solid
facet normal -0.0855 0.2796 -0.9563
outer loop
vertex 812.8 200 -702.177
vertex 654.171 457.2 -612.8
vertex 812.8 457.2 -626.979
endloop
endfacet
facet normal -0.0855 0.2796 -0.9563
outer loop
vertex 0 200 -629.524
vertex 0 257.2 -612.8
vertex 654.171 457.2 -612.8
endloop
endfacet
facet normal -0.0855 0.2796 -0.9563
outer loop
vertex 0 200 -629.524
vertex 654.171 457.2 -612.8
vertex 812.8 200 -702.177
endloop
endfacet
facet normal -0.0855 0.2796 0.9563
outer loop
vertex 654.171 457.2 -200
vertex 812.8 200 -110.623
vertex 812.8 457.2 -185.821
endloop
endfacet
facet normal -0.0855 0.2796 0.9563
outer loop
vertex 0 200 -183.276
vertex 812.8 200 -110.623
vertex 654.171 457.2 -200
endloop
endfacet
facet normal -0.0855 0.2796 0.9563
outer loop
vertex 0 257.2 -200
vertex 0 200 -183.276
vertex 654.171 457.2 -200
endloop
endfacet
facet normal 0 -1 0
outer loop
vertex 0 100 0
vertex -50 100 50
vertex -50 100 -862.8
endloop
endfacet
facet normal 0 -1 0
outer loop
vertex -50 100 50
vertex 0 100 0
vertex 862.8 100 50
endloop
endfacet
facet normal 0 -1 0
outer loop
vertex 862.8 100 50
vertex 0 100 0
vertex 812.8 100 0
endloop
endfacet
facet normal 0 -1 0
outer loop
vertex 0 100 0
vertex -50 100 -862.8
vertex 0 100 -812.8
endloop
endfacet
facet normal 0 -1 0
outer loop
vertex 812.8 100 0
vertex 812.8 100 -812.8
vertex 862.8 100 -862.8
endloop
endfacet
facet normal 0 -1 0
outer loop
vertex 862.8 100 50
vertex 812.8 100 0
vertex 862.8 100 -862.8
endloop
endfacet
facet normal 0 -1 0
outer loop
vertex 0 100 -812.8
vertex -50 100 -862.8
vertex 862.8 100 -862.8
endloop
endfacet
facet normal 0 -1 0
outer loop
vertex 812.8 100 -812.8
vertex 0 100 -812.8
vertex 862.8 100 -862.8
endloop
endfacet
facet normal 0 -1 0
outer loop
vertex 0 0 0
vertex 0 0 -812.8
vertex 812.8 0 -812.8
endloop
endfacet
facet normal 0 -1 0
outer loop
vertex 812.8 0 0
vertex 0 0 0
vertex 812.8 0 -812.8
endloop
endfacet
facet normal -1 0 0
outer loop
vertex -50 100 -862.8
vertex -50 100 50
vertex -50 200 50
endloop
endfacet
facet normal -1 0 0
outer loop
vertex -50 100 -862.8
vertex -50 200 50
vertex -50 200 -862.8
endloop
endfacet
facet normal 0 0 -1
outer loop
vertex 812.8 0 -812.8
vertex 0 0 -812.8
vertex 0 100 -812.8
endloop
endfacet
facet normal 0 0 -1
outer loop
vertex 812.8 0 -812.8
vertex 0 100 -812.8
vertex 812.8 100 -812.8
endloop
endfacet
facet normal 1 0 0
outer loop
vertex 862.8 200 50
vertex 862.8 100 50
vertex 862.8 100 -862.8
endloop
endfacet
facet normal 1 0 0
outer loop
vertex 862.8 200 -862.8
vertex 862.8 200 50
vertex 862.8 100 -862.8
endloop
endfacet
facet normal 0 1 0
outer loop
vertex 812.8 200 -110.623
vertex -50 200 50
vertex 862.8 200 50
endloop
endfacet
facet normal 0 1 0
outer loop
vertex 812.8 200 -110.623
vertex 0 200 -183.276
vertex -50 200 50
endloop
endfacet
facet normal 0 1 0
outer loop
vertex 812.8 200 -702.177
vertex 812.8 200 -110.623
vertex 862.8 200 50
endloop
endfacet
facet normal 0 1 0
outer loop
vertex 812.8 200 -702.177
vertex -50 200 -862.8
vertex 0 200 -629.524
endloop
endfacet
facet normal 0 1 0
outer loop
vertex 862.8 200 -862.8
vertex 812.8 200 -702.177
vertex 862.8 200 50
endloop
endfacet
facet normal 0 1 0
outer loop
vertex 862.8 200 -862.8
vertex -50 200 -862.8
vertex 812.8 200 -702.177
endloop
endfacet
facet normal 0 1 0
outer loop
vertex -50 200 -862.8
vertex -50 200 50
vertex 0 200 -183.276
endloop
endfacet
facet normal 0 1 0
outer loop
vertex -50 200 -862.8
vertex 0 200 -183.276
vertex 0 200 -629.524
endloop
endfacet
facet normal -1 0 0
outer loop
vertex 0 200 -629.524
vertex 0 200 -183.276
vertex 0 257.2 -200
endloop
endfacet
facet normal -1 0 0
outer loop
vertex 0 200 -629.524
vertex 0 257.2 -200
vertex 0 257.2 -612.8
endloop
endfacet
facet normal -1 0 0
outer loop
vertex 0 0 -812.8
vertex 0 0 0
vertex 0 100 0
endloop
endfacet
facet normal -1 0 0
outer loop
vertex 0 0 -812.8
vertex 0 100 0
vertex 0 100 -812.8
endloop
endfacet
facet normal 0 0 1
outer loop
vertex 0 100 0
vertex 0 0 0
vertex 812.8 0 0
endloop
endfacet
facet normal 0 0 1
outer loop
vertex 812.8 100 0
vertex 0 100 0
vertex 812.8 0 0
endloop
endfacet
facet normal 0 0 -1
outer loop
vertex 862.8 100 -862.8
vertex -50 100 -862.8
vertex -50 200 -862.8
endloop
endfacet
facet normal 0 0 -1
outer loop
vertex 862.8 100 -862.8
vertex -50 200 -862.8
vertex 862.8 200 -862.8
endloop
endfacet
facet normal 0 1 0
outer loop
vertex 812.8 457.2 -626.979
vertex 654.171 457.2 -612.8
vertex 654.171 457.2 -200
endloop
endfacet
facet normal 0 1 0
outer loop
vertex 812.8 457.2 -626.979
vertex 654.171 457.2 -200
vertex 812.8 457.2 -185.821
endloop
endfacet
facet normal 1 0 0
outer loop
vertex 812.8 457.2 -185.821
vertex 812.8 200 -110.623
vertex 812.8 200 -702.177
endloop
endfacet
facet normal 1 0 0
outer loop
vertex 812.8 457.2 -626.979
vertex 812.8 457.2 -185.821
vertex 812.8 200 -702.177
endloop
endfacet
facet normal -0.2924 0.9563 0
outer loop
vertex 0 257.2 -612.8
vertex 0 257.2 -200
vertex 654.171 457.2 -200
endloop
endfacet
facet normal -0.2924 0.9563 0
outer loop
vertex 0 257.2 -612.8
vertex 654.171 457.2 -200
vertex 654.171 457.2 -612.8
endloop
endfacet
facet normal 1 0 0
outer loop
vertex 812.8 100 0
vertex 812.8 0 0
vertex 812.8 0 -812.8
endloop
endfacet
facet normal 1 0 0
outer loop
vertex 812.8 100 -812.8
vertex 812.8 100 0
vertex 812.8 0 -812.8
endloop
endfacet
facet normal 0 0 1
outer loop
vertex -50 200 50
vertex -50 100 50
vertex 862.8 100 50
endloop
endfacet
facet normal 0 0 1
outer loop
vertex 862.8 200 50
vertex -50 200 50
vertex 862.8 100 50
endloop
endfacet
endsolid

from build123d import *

# Parameters (mm, degrees)
SKETCH2_W           = 812.8
SKETCH2_H           = 812.8
BOSS_EXTRUDE1_DEPTH = 457.2
SKETCH3_W           = 912.8
SKETCH3_H           = 912.8
SKETCH3_W_2         = 812.8
SKETCH3_H_2         = 812.8
BOSS_EXTRUDE2_DEPTH = 100
CHAMFER4_SIZE       = 200
CHAMFER4_SIZE2      = 654.170523697
CHAMFER5_SIZE       = 200
CHAMFER5_SIZE_2     = 654.170523697


with BuildPart() as part:
    # Sketch2 → Boss-Extrude1 (new body)
    with BuildSketch(Plane(origin=(0, 0, 0), x_dir=(1, 0, 0), z_dir=(0, 1, 0))):
        with Locations((406.4, 406.4)):
            Rectangle(SKETCH2_W, SKETCH2_H)
    extrude(amount=BOSS_EXTRUDE1_DEPTH)

    # Sketch3 → Boss-Extrude2 (add)
    with BuildSketch(Plane(origin=(0, 100, 0), x_dir=(1, 0, 0), z_dir=(0, 1, 0))):
        with Locations((406.4, 406.4)):
            Rectangle(SKETCH3_W, SKETCH3_H)
        with Locations((406.4, 406.4)):
            Rectangle(SKETCH3_W_2, SKETCH3_H_2, mode=Mode.SUBTRACT)
    extrude(amount=BOSS_EXTRUDE2_DEPTH)

    # Chamfer4
    chamfer4_edges = [part.edges().sort_by_distance(p)[0] for p in [
        (0, 457.2, -406.4),
    ]]
    chamfer4_side = [part.faces().sort_by_distance(p)[0] for p in [
        (0, 328.6, -406.4),
    ]]
    chamfer(chamfer4_edges, length=CHAMFER4_SIZE, length2=CHAMFER4_SIZE2, reference=chamfer4_side[0])

    # Chamfer5
    # the kernel refuses this chamfer: 654.170523697, 200 mm, written as the material it takes off along each edge
    with BuildSketch(Plane(origin=(-1623.89408898, -239.27424644, -812.8), x_dir=(-0.03497993633861633, 0.11441421636757278, 0.9928170985366542), z_dir=(0.9563047559630362, 0.2923717047227344, 0))) as chamfer5_piece_1_section:
        Polygon((CHAMFER5_SIZE * 0.992817098537, CHAMFER5_SIZE * 0.119642002881), (-CHAMFER5_SIZE_2 * 0.11964200288, CHAMFER5_SIZE_2 * 0.992817098536), (0, 0), align=None)
    chamfer5_piece_1 = extrude(amount=4080.246048475, mode=Mode.PRIVATE)
    chamfer5_piece_1 = split(chamfer5_piece_1, bisect_by=Plane(origin=(478.445479778, 200, -727.207473948), z_dir=(0, 1, 0)), keep=Keep.TOP, mode=Mode.PRIVATE)
    add(chamfer5_piece_1, mode=Mode.SUBTRACT)
    with BuildSketch(Plane(origin=(-1623.89408898, -239.27424644, 0), x_dir=(0.2923531587775955, -0.9562440949098164, 0.011263281176818211), z_dir=(0.9563047559630362, 0.2923717047227344, 0))) as chamfer5_piece_2_section:
        Polygon((CHAMFER5_SIZE_2 * 0.999936567236, CHAMFER5_SIZE_2 * 0.0112632811768), (-CHAMFER5_SIZE * 0.0112632811768, CHAMFER5_SIZE * 0.999936567237), (0, 0), align=None)
    chamfer5_piece_2 = extrude(amount=4080.246048475, mode=Mode.PRIVATE)
    chamfer5_piece_2 = split(chamfer5_piece_2, bisect_by=Plane(origin=(478.445479778, 200, -85.592526052), z_dir=(0, 1, 0)), keep=Keep.TOP, mode=Mode.PRIVATE)
    add(chamfer5_piece_2, mode=Mode.SUBTRACT)


solid = part.part
